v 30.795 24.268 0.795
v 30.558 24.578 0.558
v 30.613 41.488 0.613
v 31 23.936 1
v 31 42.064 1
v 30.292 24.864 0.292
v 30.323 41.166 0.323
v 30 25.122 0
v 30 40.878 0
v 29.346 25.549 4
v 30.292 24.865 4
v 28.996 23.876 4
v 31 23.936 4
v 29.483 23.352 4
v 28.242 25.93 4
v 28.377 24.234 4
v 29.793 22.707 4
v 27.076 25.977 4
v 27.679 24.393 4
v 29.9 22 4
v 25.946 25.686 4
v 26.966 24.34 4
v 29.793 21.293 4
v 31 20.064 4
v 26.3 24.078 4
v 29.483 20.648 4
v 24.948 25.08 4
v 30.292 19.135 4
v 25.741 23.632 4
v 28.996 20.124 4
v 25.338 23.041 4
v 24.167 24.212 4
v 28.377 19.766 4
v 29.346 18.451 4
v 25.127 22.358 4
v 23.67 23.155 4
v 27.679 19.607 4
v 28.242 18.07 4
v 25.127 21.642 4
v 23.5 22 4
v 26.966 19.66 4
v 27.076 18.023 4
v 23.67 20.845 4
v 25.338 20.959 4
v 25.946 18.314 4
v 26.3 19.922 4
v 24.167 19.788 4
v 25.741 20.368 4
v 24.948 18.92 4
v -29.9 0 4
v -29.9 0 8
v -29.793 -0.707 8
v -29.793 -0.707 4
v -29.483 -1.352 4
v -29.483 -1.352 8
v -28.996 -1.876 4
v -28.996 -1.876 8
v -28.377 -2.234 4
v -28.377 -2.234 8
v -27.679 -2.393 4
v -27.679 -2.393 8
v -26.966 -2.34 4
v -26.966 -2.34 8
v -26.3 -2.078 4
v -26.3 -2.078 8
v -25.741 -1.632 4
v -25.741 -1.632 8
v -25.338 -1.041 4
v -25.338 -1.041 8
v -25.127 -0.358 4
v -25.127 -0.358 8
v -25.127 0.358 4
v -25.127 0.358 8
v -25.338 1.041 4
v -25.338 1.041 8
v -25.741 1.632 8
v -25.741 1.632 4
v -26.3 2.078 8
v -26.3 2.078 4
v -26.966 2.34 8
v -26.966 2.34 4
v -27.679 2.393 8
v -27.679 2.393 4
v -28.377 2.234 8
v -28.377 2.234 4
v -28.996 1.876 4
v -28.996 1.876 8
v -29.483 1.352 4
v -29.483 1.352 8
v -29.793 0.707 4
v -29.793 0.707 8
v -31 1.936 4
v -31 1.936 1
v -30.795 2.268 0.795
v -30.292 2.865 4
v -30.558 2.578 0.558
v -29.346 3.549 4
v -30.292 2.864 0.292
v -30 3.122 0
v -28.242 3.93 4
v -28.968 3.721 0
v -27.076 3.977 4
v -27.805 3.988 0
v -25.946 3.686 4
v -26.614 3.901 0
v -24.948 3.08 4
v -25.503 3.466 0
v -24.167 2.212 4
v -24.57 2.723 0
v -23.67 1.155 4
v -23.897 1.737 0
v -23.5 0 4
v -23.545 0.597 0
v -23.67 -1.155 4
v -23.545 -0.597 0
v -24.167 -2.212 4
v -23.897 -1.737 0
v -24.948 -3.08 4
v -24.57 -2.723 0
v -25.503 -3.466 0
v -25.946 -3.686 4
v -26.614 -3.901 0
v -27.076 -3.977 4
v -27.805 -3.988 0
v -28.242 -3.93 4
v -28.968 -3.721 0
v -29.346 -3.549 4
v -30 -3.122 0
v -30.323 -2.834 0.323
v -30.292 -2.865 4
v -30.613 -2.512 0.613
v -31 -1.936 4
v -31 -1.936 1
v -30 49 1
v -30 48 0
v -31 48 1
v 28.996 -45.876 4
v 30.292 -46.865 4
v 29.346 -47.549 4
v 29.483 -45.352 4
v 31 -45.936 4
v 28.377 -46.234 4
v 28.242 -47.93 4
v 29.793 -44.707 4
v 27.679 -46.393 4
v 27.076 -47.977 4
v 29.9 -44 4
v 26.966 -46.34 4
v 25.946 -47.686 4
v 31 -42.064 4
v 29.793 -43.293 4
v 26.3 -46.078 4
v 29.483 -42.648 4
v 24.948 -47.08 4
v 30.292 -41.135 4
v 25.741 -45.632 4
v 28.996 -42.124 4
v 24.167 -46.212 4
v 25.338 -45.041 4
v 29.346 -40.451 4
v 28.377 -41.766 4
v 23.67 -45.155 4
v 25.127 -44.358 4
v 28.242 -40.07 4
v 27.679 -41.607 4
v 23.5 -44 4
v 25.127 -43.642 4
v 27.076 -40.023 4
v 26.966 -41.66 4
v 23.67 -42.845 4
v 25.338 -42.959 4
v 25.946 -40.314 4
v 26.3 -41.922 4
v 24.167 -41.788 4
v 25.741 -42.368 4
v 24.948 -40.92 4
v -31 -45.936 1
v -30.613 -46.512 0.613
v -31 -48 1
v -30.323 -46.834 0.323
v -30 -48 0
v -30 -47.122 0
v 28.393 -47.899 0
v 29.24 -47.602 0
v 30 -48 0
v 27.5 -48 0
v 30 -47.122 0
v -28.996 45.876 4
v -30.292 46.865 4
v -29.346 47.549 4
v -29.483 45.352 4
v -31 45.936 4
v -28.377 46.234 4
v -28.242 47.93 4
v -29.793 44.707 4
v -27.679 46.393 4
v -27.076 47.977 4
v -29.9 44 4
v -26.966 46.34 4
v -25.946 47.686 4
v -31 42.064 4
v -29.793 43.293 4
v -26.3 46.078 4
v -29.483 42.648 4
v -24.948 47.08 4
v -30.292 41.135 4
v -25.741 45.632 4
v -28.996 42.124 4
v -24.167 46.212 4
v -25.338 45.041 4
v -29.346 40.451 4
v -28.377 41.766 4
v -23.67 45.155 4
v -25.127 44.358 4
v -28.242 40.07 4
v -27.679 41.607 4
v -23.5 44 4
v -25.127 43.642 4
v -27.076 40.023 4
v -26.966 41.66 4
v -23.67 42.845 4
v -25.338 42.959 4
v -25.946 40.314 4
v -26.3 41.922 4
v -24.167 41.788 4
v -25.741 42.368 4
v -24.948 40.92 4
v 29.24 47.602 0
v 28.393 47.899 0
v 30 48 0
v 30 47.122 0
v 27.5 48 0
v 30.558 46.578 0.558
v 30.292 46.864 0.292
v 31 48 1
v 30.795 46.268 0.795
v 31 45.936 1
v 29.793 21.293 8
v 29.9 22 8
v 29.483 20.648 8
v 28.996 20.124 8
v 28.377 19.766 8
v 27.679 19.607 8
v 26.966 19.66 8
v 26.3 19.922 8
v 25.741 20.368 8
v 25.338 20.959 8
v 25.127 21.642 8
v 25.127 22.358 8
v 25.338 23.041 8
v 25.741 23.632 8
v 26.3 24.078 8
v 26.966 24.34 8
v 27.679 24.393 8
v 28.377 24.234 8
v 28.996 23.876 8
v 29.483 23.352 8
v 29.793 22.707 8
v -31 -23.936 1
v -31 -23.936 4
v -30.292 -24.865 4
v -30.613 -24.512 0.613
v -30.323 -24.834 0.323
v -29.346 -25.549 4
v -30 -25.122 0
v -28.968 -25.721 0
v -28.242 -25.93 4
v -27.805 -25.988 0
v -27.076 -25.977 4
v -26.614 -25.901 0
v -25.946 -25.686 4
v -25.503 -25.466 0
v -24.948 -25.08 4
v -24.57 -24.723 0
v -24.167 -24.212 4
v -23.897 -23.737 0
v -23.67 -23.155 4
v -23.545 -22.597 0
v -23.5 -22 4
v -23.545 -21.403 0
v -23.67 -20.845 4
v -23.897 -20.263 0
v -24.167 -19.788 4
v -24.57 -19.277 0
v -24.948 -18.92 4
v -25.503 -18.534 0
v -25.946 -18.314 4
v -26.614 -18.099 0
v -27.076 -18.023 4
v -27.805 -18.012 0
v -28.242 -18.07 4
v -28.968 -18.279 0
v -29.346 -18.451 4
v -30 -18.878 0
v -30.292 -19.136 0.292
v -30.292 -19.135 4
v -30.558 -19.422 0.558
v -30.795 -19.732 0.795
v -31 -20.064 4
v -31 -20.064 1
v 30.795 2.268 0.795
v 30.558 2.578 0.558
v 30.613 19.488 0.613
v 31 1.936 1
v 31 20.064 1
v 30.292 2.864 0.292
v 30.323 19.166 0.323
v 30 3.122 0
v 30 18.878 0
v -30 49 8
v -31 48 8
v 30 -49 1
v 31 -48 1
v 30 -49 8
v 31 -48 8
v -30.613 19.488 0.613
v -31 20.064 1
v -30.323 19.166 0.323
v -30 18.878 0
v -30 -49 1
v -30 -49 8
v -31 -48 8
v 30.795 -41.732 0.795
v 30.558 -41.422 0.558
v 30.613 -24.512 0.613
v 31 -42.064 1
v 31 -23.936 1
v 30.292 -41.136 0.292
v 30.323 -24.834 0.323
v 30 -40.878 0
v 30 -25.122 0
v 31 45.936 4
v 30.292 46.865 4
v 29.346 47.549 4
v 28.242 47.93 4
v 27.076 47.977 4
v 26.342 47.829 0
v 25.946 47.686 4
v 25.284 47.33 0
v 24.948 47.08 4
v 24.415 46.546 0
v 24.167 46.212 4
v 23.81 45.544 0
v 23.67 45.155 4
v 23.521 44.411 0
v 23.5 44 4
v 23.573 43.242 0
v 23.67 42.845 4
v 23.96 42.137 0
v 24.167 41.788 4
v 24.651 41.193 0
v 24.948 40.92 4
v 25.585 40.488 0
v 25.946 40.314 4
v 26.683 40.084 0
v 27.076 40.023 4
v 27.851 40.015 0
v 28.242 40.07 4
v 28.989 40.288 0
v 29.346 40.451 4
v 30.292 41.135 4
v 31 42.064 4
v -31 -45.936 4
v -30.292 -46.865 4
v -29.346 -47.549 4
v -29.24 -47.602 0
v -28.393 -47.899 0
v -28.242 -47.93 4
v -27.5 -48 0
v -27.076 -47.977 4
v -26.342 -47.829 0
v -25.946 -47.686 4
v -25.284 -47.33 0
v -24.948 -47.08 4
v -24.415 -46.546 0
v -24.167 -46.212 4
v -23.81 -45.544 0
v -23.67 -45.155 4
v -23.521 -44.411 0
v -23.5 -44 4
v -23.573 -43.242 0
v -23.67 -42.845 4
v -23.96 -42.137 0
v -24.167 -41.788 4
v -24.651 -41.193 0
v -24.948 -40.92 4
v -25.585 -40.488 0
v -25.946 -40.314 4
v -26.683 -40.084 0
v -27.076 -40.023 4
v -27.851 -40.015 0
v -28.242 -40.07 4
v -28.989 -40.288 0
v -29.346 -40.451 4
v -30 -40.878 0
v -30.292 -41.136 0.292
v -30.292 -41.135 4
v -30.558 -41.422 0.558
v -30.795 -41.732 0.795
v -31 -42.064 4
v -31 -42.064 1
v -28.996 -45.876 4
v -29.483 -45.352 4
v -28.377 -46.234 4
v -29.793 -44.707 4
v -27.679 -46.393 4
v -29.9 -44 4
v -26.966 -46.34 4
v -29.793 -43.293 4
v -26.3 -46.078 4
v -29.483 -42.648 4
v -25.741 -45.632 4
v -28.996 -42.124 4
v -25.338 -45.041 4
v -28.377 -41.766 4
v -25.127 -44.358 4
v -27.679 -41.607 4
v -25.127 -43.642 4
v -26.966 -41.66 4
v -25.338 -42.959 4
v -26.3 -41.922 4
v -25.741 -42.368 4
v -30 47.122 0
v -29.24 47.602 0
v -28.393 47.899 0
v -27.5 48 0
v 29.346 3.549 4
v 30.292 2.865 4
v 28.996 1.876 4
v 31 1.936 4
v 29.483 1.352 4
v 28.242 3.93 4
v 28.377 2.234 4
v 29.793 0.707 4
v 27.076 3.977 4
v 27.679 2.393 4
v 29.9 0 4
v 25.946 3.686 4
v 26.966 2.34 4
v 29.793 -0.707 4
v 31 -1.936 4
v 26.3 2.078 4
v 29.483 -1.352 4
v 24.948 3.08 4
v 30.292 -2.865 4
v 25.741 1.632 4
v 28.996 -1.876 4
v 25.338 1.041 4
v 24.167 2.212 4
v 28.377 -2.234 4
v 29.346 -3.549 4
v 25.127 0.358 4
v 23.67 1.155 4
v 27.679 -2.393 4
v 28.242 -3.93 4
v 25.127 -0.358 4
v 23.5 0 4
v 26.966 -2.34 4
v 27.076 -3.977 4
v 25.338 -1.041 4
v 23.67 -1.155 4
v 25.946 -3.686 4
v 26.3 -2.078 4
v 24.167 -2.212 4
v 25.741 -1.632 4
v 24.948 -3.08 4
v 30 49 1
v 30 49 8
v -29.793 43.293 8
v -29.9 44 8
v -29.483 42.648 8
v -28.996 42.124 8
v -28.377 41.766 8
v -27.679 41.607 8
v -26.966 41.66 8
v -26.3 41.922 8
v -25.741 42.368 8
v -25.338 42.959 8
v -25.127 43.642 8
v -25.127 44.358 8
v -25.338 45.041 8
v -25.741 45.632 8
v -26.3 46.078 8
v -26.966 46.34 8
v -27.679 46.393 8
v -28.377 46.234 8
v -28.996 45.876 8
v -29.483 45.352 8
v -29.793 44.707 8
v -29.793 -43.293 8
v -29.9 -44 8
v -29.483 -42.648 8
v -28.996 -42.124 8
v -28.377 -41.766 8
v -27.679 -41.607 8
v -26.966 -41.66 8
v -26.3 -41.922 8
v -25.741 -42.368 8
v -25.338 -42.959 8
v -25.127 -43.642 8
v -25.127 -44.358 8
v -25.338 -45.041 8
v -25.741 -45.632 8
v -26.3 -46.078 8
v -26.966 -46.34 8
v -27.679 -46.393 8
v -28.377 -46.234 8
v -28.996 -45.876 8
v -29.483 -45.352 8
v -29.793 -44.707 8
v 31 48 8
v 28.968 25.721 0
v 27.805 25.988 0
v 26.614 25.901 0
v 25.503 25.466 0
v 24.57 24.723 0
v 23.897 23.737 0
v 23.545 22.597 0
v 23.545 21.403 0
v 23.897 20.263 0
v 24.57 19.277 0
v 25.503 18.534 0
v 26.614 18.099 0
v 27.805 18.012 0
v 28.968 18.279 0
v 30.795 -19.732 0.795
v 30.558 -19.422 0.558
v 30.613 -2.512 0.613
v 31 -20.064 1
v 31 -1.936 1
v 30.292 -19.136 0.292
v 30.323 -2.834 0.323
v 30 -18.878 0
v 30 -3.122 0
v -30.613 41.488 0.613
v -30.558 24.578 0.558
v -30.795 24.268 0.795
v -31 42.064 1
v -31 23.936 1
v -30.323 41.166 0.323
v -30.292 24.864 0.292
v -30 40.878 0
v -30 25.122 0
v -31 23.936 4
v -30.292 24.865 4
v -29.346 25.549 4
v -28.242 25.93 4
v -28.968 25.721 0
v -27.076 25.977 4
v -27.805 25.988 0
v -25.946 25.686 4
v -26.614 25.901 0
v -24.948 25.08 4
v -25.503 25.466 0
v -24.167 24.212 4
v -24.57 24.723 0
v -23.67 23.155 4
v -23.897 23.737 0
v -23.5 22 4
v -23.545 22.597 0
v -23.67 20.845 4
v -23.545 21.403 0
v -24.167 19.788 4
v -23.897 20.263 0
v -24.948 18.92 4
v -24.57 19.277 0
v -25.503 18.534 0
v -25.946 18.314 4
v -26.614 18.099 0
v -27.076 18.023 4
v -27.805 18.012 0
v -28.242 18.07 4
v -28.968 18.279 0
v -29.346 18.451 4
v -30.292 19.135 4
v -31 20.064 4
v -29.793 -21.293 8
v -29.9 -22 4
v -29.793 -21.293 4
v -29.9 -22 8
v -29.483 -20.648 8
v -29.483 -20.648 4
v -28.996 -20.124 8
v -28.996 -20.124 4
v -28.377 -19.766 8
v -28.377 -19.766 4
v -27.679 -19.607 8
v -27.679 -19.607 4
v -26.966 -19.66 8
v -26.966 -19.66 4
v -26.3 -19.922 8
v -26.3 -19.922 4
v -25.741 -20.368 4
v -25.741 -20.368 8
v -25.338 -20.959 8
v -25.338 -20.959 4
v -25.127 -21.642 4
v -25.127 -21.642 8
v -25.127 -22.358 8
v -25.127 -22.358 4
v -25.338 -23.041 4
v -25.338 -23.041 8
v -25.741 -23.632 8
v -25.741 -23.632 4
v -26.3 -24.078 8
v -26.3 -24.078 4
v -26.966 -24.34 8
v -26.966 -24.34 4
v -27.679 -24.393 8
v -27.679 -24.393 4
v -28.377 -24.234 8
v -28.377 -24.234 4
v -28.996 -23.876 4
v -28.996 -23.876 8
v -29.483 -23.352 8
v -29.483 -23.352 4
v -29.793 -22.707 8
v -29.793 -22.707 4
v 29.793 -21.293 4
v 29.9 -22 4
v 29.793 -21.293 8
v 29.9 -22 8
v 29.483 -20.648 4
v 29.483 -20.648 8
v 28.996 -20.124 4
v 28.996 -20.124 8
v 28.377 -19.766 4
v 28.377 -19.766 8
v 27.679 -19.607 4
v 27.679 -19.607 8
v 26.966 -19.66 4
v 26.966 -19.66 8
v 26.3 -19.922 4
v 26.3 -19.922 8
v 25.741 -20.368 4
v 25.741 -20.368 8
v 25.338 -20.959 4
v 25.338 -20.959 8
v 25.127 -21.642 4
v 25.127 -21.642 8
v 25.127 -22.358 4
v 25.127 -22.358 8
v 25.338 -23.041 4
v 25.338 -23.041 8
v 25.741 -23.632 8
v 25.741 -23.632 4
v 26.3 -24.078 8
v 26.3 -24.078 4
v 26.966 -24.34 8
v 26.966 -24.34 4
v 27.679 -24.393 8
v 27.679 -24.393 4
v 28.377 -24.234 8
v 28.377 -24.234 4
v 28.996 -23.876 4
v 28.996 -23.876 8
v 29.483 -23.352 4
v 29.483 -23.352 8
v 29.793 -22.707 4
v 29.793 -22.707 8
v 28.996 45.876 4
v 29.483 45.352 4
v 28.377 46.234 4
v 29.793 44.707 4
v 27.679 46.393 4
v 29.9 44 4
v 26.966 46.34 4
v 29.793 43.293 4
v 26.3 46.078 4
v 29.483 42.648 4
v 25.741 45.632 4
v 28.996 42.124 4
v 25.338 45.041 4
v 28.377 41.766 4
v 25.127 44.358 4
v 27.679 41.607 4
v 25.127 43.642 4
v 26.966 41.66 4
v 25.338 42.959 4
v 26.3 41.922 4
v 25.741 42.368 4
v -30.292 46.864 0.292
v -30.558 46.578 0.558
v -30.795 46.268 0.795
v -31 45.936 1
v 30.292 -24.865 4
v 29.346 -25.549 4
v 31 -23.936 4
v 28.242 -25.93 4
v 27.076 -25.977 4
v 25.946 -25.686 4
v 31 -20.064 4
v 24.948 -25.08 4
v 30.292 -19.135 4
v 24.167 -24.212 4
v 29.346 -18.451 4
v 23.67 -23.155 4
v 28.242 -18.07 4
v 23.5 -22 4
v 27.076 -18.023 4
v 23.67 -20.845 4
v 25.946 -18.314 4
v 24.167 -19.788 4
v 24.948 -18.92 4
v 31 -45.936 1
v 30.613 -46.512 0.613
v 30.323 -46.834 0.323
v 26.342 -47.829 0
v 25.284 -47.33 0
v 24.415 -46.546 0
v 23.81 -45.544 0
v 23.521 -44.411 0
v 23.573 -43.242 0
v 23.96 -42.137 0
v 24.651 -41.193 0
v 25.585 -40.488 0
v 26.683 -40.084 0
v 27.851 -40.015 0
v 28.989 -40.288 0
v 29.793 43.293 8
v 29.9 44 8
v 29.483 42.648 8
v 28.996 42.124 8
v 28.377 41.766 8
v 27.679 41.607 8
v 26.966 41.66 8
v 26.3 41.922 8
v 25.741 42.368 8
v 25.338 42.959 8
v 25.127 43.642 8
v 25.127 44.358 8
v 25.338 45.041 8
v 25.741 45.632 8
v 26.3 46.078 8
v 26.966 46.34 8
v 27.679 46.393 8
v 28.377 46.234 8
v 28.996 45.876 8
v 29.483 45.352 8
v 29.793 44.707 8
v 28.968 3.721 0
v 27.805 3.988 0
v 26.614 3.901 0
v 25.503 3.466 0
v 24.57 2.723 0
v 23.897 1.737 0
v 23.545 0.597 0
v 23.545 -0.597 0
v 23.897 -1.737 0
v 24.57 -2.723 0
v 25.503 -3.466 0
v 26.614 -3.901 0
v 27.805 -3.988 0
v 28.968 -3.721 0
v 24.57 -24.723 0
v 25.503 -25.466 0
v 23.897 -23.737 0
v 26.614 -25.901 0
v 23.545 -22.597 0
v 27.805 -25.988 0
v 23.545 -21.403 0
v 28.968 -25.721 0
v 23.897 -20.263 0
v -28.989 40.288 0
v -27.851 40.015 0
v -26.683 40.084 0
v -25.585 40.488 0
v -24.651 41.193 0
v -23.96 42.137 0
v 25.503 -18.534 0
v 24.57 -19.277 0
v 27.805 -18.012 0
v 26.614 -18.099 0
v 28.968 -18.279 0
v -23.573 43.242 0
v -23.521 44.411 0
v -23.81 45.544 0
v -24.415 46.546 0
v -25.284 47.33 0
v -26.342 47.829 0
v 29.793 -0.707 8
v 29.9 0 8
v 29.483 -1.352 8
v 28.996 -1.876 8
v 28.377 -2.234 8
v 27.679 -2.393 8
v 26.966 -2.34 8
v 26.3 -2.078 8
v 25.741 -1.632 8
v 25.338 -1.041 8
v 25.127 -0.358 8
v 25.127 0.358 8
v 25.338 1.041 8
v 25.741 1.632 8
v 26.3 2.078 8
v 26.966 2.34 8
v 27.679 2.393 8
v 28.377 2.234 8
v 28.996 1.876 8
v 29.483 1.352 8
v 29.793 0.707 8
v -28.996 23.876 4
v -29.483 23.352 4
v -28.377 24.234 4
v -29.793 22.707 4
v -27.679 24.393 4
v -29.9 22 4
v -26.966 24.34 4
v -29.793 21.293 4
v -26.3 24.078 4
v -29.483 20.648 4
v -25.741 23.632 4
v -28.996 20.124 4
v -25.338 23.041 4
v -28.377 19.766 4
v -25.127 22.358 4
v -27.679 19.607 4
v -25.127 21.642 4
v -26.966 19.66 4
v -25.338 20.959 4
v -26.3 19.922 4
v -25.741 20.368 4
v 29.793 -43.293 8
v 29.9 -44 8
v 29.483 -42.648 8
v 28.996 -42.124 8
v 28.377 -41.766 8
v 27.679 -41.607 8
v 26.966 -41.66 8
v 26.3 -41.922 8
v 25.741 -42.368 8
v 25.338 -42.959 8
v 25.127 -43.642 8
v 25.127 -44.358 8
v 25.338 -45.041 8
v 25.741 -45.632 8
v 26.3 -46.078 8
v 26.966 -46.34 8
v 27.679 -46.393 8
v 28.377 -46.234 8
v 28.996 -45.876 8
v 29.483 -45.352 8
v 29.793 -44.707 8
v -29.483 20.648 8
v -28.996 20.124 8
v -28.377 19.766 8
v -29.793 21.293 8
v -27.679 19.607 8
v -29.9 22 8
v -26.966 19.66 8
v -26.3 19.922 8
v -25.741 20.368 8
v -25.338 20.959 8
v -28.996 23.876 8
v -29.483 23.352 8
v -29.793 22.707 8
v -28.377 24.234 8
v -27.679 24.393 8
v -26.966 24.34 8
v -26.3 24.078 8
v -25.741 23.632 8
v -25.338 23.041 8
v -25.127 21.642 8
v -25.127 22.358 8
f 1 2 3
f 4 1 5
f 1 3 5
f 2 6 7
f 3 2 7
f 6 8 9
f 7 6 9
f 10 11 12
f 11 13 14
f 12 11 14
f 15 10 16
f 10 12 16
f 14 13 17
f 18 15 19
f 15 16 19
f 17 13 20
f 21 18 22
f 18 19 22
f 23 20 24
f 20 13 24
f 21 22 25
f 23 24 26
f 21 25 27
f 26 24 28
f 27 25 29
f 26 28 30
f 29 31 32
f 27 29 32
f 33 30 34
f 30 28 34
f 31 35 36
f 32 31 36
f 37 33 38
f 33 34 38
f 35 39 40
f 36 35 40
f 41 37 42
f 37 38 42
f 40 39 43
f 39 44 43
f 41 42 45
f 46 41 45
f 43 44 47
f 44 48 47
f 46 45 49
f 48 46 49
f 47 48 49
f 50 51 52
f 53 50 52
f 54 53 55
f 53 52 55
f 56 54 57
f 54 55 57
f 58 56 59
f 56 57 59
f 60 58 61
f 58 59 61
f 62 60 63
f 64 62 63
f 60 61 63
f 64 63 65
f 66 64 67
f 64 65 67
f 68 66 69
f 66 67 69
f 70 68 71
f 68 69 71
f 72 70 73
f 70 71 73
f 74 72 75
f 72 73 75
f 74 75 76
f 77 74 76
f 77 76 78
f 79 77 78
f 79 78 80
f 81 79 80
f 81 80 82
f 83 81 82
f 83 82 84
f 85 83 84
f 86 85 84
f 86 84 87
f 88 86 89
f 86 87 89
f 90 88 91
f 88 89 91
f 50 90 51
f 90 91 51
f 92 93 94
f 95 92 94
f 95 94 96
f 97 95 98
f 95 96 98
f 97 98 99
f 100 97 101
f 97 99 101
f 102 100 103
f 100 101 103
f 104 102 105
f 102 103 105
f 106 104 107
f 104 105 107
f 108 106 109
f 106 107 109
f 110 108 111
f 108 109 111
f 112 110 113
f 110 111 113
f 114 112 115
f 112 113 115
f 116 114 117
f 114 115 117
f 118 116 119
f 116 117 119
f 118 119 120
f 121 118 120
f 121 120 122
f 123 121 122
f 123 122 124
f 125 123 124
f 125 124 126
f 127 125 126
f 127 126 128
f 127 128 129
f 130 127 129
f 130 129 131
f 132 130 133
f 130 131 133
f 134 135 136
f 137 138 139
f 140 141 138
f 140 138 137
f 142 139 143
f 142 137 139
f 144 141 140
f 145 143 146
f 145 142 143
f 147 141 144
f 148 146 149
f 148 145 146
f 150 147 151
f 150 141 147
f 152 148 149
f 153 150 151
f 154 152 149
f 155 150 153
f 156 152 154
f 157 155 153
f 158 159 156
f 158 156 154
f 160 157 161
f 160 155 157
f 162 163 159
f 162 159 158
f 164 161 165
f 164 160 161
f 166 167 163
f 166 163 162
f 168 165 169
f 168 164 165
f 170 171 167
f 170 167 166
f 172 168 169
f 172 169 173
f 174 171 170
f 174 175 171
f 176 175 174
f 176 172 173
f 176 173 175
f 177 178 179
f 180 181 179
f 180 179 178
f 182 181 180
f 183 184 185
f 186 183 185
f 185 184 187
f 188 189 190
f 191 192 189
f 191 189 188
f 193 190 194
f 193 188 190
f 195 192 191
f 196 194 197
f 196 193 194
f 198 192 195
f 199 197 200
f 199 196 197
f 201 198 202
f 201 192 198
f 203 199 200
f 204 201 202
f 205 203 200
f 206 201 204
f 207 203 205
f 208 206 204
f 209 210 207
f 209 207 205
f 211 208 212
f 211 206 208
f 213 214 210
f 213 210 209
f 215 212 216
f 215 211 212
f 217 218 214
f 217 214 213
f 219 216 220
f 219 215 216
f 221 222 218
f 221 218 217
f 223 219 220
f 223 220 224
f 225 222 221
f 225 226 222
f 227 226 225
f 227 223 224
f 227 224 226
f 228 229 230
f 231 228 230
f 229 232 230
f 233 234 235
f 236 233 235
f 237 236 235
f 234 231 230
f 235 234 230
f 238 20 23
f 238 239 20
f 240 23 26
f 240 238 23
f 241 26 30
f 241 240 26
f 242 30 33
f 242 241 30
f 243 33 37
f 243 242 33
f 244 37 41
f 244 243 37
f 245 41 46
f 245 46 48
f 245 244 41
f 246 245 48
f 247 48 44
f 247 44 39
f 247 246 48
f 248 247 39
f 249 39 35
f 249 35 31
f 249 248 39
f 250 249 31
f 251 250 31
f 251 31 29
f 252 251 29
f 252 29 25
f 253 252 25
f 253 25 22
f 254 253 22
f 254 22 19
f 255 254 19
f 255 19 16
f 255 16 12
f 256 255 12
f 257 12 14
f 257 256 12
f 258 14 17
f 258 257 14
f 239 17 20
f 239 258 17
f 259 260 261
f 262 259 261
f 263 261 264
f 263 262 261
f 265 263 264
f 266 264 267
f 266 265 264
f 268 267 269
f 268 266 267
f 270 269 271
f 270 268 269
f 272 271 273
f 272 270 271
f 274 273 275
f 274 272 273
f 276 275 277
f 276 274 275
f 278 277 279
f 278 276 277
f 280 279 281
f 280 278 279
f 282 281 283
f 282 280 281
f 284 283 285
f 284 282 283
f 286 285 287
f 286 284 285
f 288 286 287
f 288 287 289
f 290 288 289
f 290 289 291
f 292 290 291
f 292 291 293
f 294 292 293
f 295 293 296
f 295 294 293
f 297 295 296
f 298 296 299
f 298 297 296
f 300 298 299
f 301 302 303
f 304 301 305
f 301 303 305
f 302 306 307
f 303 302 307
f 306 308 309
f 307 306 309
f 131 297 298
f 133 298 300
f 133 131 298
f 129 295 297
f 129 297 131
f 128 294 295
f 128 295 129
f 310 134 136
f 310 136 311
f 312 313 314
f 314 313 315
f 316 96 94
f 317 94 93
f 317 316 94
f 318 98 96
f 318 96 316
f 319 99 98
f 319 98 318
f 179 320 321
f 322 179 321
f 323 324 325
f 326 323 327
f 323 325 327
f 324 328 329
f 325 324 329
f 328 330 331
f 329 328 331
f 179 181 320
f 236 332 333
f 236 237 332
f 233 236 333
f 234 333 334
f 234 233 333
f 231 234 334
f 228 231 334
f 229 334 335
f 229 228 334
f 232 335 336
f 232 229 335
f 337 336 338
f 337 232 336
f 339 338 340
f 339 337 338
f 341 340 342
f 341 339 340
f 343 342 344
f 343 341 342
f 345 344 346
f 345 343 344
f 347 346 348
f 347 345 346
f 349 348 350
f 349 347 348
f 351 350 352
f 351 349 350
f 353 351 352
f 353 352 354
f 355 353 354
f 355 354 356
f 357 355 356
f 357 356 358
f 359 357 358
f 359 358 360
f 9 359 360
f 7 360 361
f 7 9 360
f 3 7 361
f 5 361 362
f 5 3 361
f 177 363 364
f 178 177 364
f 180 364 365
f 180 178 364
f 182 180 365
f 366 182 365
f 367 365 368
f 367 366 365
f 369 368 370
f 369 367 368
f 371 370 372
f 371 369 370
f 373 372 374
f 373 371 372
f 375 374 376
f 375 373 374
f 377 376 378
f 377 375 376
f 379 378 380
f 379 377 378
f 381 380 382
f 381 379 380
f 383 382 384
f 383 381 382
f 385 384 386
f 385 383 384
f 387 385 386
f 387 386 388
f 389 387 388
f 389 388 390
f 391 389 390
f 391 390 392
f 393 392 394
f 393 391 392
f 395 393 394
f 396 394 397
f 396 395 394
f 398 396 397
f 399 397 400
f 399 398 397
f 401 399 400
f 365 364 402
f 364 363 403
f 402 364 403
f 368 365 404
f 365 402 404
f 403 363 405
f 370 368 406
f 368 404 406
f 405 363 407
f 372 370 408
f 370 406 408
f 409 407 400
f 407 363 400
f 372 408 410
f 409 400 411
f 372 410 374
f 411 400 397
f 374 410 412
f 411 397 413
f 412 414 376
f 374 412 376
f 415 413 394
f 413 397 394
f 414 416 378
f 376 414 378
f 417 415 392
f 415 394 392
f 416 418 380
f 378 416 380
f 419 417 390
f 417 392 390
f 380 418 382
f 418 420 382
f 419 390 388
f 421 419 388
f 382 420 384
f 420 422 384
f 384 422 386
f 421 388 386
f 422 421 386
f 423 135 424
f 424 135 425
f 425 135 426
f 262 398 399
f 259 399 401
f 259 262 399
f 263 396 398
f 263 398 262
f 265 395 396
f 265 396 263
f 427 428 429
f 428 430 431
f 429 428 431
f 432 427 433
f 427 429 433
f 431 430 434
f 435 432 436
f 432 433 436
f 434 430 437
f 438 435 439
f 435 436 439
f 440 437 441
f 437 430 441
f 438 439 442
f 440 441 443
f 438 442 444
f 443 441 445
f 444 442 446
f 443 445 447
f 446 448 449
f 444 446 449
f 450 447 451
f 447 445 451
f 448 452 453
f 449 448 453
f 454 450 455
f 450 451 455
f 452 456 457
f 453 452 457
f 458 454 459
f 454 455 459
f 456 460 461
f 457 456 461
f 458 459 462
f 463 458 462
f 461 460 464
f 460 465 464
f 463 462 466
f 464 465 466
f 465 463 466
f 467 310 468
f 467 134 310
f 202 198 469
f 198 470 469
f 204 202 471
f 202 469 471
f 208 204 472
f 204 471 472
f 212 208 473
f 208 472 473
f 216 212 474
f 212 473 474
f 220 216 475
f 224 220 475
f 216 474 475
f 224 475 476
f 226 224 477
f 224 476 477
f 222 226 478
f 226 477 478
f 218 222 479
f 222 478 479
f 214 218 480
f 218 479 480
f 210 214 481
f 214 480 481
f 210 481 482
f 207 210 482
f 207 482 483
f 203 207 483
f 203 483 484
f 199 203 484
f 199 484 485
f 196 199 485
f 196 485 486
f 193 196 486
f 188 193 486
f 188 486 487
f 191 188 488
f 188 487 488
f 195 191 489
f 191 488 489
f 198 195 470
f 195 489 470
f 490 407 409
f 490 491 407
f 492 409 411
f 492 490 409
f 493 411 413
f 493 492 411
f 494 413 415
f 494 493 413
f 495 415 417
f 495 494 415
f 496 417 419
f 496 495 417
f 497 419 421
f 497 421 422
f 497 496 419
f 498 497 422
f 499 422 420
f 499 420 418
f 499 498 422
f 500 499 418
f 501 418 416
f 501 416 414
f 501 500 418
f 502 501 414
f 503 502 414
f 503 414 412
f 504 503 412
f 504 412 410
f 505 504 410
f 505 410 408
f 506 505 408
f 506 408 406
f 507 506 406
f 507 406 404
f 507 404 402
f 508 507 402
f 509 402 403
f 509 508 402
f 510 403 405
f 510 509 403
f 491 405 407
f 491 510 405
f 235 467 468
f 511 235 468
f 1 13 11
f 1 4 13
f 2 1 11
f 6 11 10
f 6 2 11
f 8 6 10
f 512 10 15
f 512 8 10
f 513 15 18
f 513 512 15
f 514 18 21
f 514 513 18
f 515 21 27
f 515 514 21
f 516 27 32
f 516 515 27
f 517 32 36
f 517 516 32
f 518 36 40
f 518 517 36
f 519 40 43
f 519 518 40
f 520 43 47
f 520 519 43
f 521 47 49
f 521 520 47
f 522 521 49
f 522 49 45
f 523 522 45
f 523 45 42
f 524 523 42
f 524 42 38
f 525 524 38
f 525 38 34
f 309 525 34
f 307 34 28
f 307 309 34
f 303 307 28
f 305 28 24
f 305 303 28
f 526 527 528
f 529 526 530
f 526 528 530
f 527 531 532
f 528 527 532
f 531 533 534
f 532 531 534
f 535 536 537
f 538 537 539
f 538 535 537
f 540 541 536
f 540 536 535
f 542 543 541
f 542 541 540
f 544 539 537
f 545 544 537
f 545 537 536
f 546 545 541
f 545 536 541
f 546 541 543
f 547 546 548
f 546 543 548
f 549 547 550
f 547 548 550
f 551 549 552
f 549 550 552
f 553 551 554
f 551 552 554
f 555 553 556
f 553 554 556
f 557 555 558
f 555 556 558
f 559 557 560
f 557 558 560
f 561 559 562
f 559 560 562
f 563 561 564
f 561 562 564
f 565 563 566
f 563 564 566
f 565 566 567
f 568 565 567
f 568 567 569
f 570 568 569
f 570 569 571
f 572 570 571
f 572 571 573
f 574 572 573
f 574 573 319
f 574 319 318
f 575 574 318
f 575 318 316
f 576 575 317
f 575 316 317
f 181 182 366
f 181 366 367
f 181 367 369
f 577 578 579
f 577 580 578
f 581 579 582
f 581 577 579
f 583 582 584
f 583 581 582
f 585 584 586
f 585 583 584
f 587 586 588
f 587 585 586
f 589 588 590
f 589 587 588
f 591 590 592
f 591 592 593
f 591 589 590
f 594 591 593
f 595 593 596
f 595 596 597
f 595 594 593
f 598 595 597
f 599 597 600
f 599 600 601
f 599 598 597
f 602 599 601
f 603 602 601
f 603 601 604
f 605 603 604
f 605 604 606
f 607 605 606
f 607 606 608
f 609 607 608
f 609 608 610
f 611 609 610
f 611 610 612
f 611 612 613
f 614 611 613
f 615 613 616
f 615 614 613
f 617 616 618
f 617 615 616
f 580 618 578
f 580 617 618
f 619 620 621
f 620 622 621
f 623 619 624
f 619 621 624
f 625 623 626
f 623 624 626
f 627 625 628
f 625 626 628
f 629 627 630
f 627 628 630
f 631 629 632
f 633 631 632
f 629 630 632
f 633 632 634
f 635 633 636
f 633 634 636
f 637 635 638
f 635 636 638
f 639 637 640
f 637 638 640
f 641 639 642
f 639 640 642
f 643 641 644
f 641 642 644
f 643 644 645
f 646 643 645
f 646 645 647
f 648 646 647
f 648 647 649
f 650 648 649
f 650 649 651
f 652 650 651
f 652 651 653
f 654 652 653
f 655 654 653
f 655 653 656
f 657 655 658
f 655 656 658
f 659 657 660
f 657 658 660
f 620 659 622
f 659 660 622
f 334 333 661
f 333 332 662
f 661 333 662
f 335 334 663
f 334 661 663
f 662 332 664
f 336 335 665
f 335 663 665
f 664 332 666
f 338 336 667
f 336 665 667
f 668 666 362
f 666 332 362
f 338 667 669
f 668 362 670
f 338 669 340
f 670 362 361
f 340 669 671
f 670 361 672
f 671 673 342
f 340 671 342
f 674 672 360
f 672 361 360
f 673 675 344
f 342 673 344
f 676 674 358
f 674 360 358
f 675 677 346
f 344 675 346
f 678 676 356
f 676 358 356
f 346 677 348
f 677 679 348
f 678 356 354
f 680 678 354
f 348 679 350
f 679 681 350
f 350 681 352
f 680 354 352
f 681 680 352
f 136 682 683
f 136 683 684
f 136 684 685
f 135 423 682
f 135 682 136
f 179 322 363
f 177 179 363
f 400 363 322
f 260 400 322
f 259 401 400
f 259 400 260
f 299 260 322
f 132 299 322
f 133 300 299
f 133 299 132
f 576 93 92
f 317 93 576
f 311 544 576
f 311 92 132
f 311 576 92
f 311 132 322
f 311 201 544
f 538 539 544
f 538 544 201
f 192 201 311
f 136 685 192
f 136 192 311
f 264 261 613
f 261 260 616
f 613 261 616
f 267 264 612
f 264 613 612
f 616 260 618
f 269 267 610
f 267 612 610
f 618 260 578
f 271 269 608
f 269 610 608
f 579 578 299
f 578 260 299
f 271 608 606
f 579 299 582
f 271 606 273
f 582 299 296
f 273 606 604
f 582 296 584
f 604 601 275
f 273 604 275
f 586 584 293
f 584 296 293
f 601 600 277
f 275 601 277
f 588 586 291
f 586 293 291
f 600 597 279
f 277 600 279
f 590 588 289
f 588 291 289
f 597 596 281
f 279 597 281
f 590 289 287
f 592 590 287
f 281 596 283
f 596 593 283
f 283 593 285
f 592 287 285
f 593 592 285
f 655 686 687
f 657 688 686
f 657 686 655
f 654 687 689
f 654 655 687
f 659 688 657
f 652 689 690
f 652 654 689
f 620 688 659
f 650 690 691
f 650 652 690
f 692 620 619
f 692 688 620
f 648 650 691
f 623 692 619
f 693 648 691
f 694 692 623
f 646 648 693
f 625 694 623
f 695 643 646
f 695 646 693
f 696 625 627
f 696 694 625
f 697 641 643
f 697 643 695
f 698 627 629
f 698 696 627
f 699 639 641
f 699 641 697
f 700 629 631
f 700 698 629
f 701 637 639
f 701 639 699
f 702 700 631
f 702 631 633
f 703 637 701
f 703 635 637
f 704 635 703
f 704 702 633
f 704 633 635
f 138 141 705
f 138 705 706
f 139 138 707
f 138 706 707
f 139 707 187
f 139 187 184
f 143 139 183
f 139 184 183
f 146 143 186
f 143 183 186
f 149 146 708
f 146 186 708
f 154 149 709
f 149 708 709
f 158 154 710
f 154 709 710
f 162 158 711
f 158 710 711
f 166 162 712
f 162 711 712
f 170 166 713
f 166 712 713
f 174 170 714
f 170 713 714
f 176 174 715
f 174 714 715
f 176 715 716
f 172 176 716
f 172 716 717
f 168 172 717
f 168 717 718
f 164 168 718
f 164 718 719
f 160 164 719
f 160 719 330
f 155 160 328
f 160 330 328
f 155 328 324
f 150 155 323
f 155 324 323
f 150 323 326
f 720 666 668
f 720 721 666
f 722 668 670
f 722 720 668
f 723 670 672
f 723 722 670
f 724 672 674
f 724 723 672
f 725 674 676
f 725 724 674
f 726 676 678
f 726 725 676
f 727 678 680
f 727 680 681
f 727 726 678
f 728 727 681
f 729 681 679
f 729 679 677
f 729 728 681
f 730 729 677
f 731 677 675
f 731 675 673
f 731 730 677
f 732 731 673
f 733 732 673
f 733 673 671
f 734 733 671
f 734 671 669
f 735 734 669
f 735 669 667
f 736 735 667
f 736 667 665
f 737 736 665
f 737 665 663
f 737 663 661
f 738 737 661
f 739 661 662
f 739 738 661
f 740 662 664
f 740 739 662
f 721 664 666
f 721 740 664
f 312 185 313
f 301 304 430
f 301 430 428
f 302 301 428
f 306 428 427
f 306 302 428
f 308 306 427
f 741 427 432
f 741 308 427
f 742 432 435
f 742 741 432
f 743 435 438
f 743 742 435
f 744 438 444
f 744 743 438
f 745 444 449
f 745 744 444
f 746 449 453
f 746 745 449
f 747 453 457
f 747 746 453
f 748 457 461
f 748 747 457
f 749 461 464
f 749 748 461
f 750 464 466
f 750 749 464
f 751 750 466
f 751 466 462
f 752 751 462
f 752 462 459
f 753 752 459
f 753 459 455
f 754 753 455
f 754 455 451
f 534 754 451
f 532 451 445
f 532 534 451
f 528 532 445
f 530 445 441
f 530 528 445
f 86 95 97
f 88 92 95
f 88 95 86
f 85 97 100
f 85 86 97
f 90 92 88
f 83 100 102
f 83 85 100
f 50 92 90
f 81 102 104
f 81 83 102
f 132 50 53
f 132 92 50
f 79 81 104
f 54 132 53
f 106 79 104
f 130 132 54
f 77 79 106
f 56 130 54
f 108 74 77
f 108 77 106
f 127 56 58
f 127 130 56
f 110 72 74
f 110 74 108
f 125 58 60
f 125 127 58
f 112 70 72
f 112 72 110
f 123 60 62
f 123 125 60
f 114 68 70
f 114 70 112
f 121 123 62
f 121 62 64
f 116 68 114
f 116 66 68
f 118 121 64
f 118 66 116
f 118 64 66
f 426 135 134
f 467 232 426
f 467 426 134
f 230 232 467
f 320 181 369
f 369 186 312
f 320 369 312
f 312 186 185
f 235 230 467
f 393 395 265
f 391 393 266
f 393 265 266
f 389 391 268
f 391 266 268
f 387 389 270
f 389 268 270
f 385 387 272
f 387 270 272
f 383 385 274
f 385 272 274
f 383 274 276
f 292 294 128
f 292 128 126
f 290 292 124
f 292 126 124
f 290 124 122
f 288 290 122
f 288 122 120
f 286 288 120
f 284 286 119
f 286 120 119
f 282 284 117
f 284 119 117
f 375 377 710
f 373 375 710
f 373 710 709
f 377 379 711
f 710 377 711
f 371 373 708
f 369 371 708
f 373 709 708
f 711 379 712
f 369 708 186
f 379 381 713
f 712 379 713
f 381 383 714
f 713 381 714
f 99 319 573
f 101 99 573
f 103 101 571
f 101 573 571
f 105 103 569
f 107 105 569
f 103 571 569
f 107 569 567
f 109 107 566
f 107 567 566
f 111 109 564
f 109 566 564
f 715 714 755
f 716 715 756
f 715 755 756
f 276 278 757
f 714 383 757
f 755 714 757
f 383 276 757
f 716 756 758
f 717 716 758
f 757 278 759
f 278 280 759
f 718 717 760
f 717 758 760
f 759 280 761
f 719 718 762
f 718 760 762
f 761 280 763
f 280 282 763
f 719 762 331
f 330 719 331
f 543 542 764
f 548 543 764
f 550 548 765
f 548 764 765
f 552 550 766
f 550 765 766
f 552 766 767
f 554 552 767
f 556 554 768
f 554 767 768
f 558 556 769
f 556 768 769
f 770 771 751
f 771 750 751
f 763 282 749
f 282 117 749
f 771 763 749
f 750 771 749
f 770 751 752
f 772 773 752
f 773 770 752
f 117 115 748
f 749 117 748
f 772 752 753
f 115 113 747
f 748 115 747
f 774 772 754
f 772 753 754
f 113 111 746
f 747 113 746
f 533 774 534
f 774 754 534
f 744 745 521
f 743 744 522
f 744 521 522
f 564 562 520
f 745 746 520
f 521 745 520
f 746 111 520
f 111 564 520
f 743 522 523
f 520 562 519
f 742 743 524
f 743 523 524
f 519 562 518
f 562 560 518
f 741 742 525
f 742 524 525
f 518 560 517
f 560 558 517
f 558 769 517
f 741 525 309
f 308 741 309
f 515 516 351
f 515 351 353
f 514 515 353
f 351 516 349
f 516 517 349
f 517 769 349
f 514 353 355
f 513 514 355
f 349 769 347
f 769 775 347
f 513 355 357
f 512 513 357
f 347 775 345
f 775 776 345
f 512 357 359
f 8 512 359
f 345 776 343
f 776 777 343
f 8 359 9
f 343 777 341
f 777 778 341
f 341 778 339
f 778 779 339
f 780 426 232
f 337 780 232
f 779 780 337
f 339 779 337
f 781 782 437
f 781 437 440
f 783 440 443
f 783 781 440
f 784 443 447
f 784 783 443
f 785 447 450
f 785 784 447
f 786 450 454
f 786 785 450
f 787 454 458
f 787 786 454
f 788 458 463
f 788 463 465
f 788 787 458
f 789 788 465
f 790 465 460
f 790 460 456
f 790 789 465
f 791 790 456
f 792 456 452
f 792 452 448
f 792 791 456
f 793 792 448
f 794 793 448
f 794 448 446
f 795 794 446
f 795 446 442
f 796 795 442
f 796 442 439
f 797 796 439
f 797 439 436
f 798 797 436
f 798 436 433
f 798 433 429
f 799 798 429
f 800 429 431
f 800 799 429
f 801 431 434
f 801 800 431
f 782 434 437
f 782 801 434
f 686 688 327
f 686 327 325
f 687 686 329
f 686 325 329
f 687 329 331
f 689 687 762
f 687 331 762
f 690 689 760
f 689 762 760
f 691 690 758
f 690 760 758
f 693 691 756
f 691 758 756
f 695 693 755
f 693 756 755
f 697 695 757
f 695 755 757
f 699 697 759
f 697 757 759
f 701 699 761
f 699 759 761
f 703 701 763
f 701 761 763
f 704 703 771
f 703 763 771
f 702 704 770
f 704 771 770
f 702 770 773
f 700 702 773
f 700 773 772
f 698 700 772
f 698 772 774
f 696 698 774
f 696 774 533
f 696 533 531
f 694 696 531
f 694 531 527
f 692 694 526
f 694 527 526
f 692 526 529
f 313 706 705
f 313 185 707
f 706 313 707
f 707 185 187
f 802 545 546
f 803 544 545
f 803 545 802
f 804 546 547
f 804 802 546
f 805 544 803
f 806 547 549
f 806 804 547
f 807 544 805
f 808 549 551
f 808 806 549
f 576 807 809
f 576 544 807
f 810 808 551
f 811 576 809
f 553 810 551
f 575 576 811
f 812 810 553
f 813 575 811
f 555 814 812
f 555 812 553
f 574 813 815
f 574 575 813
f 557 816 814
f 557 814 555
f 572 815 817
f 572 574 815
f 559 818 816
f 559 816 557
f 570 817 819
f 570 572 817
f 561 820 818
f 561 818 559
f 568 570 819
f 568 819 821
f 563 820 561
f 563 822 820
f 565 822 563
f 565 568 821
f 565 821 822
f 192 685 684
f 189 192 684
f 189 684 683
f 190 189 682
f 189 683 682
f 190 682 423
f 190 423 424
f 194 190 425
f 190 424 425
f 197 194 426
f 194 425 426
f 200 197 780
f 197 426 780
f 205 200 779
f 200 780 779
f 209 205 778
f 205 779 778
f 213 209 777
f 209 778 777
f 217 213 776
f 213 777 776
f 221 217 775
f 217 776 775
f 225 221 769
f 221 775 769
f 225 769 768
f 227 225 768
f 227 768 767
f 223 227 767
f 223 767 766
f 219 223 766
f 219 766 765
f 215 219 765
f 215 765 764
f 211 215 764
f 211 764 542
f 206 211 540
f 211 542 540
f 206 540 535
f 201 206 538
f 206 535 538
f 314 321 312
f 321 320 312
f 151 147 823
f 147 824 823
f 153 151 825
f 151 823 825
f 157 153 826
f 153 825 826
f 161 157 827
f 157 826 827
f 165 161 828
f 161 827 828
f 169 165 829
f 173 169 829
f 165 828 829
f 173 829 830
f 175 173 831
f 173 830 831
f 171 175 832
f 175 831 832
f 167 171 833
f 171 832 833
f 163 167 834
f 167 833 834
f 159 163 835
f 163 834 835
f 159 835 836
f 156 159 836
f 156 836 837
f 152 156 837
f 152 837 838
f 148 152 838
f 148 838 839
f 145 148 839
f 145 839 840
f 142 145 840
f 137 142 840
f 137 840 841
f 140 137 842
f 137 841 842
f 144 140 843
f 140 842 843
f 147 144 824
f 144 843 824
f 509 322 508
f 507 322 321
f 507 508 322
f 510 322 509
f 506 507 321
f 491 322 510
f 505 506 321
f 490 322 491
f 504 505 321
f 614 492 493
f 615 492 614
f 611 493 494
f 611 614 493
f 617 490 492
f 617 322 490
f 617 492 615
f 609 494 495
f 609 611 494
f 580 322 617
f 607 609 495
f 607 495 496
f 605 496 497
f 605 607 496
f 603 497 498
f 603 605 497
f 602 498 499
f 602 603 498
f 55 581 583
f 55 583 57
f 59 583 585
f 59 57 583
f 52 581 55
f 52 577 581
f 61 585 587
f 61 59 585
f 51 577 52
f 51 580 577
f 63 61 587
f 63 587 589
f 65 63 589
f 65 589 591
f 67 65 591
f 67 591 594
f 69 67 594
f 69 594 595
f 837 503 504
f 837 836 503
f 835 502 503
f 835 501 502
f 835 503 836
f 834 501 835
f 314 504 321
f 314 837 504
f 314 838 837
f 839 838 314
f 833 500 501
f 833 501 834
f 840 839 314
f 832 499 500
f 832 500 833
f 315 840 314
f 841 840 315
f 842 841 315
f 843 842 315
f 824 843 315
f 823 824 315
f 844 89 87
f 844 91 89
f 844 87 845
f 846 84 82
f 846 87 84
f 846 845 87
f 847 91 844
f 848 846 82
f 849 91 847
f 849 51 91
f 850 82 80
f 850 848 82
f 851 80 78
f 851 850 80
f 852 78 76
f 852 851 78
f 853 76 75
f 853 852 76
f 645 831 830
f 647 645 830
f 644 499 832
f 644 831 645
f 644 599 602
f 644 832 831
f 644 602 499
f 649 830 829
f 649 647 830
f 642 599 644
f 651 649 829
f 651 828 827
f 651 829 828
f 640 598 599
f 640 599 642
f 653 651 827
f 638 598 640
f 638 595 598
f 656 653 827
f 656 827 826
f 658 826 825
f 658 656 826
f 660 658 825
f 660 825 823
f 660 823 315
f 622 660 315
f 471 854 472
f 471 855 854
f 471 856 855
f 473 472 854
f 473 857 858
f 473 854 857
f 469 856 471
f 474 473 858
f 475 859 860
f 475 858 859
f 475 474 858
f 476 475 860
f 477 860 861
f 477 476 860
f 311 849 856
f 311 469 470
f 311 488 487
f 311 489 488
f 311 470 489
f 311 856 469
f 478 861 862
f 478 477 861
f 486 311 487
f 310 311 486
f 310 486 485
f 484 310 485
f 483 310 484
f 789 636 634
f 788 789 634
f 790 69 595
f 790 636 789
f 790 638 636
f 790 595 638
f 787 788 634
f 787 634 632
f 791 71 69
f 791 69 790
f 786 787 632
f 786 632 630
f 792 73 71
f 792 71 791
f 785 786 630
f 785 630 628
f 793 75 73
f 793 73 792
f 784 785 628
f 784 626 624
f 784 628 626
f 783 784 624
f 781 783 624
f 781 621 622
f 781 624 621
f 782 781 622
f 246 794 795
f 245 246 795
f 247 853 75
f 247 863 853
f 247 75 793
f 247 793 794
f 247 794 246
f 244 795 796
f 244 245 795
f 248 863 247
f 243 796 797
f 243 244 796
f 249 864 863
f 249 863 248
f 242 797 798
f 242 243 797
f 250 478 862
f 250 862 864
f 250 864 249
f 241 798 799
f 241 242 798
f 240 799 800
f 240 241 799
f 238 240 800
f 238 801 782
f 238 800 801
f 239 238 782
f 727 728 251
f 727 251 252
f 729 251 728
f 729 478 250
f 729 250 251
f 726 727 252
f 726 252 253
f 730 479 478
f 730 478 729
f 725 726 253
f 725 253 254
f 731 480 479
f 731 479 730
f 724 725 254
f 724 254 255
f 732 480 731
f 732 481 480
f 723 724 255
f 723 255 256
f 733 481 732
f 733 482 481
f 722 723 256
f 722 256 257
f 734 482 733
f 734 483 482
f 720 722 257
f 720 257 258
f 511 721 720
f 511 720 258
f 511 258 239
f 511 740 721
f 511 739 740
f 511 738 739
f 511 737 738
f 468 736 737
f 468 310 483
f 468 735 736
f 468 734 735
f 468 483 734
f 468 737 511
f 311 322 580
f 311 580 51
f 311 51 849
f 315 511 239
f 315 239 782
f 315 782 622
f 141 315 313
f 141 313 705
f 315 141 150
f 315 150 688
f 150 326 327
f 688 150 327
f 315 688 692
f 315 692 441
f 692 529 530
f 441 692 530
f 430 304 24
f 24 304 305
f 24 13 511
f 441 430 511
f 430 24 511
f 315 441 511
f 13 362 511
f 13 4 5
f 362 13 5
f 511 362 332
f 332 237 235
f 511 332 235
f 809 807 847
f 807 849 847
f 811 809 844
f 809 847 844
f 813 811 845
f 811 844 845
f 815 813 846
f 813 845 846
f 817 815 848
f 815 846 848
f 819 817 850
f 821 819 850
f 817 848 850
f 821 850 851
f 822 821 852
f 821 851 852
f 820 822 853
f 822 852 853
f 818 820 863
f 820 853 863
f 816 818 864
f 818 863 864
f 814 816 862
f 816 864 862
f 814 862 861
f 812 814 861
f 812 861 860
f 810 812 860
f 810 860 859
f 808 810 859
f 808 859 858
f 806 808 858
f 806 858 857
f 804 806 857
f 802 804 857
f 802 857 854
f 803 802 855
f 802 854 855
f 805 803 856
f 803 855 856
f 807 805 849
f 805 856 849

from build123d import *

# Parameters (mm, degrees)
SKETCH_1_W                   = 62
SKETCH_1_H                   = 98
EXTRUDE_1_DEPTH              = 8
CHAMFER_1_SIZE               = 1
HOLE_WIZARD_M4_1_D           = 4.8
HOLE_WIZARD_M4_1_CBORE_D     = 8
HOLE_WIZARD_M4_1_CBORE_DEPTH = 4
MIRROR_2_COPY_1_D            = 4.8
MIRROR_2_COPY_1_CBORE_D      = 8
MIRROR_2_COPY_1_CBORE_DEPTH  = 4


with BuildPart() as part:
    # ｽｹｯﾁ1 → ﾎﾞｽ - 押し出し1 (new body)
    with BuildSketch(Plane.XY):
        Rectangle(SKETCH_1_W, SKETCH_1_H)
    extrude(amount=EXTRUDE_1_DEPTH)

    # 面取り1
    chamfer_1_edges = [part.edges().sort_by_distance(p)[0] for p in [
        (0, -49, 0),
        (-31, 0, 0),
        (0, 49, 0),
        (31, 0, 0),
        (31, -49, 4),
        (-31, -49, 4),
        (-31, 49, 4),
        (31, 49, 4),
    ]]
    chamfer(chamfer_1_edges, length=CHAMFER_1_SIZE)

    # M4 穴付きねじ用座ぐり穴1 (through all)
    with Locations(Plane(origin=(0, 0, 0), x_dir=(1, 0, 0), z_dir=(0, 0, -1))):
        with Locations((-27.5, -44), (-27.5, -22), (-27.5, 0)):
            hole_wizard_m4_1 = CounterBoreHole(HOLE_WIZARD_M4_1_D / 2, HOLE_WIZARD_M4_1_CBORE_D / 2, HOLE_WIZARD_M4_1_CBORE_DEPTH)

    # ﾐﾗｰ1: M4 穴付きねじ用座ぐり穴1 across plane
    add(hole_wizard_m4_1.mirror(Plane.ZX), mode=Mode.SUBTRACT)

    # ﾐﾗｰ2: M4 穴付きねじ用座ぐり穴1 across plane
    add(hole_wizard_m4_1.mirror(Plane(origin=(0, 0, 0), x_dir=(0, 0, 1), z_dir=(1, 0, 0))), mode=Mode.SUBTRACT)

    # ﾐﾗｰ2 copy 1 (through all)
    with Locations(Plane(origin=(0, 0, 0), x_dir=(-1, 0, 0), z_dir=(0, 0, -1))):
        with Locations((-27.5, -44), (-27.5, -22), (-27.5, 0)):
            CounterBoreHole(MIRROR_2_COPY_1_D / 2, MIRROR_2_COPY_1_CBORE_D / 2, MIRROR_2_COPY_1_CBORE_DEPTH)


solid = part.part
